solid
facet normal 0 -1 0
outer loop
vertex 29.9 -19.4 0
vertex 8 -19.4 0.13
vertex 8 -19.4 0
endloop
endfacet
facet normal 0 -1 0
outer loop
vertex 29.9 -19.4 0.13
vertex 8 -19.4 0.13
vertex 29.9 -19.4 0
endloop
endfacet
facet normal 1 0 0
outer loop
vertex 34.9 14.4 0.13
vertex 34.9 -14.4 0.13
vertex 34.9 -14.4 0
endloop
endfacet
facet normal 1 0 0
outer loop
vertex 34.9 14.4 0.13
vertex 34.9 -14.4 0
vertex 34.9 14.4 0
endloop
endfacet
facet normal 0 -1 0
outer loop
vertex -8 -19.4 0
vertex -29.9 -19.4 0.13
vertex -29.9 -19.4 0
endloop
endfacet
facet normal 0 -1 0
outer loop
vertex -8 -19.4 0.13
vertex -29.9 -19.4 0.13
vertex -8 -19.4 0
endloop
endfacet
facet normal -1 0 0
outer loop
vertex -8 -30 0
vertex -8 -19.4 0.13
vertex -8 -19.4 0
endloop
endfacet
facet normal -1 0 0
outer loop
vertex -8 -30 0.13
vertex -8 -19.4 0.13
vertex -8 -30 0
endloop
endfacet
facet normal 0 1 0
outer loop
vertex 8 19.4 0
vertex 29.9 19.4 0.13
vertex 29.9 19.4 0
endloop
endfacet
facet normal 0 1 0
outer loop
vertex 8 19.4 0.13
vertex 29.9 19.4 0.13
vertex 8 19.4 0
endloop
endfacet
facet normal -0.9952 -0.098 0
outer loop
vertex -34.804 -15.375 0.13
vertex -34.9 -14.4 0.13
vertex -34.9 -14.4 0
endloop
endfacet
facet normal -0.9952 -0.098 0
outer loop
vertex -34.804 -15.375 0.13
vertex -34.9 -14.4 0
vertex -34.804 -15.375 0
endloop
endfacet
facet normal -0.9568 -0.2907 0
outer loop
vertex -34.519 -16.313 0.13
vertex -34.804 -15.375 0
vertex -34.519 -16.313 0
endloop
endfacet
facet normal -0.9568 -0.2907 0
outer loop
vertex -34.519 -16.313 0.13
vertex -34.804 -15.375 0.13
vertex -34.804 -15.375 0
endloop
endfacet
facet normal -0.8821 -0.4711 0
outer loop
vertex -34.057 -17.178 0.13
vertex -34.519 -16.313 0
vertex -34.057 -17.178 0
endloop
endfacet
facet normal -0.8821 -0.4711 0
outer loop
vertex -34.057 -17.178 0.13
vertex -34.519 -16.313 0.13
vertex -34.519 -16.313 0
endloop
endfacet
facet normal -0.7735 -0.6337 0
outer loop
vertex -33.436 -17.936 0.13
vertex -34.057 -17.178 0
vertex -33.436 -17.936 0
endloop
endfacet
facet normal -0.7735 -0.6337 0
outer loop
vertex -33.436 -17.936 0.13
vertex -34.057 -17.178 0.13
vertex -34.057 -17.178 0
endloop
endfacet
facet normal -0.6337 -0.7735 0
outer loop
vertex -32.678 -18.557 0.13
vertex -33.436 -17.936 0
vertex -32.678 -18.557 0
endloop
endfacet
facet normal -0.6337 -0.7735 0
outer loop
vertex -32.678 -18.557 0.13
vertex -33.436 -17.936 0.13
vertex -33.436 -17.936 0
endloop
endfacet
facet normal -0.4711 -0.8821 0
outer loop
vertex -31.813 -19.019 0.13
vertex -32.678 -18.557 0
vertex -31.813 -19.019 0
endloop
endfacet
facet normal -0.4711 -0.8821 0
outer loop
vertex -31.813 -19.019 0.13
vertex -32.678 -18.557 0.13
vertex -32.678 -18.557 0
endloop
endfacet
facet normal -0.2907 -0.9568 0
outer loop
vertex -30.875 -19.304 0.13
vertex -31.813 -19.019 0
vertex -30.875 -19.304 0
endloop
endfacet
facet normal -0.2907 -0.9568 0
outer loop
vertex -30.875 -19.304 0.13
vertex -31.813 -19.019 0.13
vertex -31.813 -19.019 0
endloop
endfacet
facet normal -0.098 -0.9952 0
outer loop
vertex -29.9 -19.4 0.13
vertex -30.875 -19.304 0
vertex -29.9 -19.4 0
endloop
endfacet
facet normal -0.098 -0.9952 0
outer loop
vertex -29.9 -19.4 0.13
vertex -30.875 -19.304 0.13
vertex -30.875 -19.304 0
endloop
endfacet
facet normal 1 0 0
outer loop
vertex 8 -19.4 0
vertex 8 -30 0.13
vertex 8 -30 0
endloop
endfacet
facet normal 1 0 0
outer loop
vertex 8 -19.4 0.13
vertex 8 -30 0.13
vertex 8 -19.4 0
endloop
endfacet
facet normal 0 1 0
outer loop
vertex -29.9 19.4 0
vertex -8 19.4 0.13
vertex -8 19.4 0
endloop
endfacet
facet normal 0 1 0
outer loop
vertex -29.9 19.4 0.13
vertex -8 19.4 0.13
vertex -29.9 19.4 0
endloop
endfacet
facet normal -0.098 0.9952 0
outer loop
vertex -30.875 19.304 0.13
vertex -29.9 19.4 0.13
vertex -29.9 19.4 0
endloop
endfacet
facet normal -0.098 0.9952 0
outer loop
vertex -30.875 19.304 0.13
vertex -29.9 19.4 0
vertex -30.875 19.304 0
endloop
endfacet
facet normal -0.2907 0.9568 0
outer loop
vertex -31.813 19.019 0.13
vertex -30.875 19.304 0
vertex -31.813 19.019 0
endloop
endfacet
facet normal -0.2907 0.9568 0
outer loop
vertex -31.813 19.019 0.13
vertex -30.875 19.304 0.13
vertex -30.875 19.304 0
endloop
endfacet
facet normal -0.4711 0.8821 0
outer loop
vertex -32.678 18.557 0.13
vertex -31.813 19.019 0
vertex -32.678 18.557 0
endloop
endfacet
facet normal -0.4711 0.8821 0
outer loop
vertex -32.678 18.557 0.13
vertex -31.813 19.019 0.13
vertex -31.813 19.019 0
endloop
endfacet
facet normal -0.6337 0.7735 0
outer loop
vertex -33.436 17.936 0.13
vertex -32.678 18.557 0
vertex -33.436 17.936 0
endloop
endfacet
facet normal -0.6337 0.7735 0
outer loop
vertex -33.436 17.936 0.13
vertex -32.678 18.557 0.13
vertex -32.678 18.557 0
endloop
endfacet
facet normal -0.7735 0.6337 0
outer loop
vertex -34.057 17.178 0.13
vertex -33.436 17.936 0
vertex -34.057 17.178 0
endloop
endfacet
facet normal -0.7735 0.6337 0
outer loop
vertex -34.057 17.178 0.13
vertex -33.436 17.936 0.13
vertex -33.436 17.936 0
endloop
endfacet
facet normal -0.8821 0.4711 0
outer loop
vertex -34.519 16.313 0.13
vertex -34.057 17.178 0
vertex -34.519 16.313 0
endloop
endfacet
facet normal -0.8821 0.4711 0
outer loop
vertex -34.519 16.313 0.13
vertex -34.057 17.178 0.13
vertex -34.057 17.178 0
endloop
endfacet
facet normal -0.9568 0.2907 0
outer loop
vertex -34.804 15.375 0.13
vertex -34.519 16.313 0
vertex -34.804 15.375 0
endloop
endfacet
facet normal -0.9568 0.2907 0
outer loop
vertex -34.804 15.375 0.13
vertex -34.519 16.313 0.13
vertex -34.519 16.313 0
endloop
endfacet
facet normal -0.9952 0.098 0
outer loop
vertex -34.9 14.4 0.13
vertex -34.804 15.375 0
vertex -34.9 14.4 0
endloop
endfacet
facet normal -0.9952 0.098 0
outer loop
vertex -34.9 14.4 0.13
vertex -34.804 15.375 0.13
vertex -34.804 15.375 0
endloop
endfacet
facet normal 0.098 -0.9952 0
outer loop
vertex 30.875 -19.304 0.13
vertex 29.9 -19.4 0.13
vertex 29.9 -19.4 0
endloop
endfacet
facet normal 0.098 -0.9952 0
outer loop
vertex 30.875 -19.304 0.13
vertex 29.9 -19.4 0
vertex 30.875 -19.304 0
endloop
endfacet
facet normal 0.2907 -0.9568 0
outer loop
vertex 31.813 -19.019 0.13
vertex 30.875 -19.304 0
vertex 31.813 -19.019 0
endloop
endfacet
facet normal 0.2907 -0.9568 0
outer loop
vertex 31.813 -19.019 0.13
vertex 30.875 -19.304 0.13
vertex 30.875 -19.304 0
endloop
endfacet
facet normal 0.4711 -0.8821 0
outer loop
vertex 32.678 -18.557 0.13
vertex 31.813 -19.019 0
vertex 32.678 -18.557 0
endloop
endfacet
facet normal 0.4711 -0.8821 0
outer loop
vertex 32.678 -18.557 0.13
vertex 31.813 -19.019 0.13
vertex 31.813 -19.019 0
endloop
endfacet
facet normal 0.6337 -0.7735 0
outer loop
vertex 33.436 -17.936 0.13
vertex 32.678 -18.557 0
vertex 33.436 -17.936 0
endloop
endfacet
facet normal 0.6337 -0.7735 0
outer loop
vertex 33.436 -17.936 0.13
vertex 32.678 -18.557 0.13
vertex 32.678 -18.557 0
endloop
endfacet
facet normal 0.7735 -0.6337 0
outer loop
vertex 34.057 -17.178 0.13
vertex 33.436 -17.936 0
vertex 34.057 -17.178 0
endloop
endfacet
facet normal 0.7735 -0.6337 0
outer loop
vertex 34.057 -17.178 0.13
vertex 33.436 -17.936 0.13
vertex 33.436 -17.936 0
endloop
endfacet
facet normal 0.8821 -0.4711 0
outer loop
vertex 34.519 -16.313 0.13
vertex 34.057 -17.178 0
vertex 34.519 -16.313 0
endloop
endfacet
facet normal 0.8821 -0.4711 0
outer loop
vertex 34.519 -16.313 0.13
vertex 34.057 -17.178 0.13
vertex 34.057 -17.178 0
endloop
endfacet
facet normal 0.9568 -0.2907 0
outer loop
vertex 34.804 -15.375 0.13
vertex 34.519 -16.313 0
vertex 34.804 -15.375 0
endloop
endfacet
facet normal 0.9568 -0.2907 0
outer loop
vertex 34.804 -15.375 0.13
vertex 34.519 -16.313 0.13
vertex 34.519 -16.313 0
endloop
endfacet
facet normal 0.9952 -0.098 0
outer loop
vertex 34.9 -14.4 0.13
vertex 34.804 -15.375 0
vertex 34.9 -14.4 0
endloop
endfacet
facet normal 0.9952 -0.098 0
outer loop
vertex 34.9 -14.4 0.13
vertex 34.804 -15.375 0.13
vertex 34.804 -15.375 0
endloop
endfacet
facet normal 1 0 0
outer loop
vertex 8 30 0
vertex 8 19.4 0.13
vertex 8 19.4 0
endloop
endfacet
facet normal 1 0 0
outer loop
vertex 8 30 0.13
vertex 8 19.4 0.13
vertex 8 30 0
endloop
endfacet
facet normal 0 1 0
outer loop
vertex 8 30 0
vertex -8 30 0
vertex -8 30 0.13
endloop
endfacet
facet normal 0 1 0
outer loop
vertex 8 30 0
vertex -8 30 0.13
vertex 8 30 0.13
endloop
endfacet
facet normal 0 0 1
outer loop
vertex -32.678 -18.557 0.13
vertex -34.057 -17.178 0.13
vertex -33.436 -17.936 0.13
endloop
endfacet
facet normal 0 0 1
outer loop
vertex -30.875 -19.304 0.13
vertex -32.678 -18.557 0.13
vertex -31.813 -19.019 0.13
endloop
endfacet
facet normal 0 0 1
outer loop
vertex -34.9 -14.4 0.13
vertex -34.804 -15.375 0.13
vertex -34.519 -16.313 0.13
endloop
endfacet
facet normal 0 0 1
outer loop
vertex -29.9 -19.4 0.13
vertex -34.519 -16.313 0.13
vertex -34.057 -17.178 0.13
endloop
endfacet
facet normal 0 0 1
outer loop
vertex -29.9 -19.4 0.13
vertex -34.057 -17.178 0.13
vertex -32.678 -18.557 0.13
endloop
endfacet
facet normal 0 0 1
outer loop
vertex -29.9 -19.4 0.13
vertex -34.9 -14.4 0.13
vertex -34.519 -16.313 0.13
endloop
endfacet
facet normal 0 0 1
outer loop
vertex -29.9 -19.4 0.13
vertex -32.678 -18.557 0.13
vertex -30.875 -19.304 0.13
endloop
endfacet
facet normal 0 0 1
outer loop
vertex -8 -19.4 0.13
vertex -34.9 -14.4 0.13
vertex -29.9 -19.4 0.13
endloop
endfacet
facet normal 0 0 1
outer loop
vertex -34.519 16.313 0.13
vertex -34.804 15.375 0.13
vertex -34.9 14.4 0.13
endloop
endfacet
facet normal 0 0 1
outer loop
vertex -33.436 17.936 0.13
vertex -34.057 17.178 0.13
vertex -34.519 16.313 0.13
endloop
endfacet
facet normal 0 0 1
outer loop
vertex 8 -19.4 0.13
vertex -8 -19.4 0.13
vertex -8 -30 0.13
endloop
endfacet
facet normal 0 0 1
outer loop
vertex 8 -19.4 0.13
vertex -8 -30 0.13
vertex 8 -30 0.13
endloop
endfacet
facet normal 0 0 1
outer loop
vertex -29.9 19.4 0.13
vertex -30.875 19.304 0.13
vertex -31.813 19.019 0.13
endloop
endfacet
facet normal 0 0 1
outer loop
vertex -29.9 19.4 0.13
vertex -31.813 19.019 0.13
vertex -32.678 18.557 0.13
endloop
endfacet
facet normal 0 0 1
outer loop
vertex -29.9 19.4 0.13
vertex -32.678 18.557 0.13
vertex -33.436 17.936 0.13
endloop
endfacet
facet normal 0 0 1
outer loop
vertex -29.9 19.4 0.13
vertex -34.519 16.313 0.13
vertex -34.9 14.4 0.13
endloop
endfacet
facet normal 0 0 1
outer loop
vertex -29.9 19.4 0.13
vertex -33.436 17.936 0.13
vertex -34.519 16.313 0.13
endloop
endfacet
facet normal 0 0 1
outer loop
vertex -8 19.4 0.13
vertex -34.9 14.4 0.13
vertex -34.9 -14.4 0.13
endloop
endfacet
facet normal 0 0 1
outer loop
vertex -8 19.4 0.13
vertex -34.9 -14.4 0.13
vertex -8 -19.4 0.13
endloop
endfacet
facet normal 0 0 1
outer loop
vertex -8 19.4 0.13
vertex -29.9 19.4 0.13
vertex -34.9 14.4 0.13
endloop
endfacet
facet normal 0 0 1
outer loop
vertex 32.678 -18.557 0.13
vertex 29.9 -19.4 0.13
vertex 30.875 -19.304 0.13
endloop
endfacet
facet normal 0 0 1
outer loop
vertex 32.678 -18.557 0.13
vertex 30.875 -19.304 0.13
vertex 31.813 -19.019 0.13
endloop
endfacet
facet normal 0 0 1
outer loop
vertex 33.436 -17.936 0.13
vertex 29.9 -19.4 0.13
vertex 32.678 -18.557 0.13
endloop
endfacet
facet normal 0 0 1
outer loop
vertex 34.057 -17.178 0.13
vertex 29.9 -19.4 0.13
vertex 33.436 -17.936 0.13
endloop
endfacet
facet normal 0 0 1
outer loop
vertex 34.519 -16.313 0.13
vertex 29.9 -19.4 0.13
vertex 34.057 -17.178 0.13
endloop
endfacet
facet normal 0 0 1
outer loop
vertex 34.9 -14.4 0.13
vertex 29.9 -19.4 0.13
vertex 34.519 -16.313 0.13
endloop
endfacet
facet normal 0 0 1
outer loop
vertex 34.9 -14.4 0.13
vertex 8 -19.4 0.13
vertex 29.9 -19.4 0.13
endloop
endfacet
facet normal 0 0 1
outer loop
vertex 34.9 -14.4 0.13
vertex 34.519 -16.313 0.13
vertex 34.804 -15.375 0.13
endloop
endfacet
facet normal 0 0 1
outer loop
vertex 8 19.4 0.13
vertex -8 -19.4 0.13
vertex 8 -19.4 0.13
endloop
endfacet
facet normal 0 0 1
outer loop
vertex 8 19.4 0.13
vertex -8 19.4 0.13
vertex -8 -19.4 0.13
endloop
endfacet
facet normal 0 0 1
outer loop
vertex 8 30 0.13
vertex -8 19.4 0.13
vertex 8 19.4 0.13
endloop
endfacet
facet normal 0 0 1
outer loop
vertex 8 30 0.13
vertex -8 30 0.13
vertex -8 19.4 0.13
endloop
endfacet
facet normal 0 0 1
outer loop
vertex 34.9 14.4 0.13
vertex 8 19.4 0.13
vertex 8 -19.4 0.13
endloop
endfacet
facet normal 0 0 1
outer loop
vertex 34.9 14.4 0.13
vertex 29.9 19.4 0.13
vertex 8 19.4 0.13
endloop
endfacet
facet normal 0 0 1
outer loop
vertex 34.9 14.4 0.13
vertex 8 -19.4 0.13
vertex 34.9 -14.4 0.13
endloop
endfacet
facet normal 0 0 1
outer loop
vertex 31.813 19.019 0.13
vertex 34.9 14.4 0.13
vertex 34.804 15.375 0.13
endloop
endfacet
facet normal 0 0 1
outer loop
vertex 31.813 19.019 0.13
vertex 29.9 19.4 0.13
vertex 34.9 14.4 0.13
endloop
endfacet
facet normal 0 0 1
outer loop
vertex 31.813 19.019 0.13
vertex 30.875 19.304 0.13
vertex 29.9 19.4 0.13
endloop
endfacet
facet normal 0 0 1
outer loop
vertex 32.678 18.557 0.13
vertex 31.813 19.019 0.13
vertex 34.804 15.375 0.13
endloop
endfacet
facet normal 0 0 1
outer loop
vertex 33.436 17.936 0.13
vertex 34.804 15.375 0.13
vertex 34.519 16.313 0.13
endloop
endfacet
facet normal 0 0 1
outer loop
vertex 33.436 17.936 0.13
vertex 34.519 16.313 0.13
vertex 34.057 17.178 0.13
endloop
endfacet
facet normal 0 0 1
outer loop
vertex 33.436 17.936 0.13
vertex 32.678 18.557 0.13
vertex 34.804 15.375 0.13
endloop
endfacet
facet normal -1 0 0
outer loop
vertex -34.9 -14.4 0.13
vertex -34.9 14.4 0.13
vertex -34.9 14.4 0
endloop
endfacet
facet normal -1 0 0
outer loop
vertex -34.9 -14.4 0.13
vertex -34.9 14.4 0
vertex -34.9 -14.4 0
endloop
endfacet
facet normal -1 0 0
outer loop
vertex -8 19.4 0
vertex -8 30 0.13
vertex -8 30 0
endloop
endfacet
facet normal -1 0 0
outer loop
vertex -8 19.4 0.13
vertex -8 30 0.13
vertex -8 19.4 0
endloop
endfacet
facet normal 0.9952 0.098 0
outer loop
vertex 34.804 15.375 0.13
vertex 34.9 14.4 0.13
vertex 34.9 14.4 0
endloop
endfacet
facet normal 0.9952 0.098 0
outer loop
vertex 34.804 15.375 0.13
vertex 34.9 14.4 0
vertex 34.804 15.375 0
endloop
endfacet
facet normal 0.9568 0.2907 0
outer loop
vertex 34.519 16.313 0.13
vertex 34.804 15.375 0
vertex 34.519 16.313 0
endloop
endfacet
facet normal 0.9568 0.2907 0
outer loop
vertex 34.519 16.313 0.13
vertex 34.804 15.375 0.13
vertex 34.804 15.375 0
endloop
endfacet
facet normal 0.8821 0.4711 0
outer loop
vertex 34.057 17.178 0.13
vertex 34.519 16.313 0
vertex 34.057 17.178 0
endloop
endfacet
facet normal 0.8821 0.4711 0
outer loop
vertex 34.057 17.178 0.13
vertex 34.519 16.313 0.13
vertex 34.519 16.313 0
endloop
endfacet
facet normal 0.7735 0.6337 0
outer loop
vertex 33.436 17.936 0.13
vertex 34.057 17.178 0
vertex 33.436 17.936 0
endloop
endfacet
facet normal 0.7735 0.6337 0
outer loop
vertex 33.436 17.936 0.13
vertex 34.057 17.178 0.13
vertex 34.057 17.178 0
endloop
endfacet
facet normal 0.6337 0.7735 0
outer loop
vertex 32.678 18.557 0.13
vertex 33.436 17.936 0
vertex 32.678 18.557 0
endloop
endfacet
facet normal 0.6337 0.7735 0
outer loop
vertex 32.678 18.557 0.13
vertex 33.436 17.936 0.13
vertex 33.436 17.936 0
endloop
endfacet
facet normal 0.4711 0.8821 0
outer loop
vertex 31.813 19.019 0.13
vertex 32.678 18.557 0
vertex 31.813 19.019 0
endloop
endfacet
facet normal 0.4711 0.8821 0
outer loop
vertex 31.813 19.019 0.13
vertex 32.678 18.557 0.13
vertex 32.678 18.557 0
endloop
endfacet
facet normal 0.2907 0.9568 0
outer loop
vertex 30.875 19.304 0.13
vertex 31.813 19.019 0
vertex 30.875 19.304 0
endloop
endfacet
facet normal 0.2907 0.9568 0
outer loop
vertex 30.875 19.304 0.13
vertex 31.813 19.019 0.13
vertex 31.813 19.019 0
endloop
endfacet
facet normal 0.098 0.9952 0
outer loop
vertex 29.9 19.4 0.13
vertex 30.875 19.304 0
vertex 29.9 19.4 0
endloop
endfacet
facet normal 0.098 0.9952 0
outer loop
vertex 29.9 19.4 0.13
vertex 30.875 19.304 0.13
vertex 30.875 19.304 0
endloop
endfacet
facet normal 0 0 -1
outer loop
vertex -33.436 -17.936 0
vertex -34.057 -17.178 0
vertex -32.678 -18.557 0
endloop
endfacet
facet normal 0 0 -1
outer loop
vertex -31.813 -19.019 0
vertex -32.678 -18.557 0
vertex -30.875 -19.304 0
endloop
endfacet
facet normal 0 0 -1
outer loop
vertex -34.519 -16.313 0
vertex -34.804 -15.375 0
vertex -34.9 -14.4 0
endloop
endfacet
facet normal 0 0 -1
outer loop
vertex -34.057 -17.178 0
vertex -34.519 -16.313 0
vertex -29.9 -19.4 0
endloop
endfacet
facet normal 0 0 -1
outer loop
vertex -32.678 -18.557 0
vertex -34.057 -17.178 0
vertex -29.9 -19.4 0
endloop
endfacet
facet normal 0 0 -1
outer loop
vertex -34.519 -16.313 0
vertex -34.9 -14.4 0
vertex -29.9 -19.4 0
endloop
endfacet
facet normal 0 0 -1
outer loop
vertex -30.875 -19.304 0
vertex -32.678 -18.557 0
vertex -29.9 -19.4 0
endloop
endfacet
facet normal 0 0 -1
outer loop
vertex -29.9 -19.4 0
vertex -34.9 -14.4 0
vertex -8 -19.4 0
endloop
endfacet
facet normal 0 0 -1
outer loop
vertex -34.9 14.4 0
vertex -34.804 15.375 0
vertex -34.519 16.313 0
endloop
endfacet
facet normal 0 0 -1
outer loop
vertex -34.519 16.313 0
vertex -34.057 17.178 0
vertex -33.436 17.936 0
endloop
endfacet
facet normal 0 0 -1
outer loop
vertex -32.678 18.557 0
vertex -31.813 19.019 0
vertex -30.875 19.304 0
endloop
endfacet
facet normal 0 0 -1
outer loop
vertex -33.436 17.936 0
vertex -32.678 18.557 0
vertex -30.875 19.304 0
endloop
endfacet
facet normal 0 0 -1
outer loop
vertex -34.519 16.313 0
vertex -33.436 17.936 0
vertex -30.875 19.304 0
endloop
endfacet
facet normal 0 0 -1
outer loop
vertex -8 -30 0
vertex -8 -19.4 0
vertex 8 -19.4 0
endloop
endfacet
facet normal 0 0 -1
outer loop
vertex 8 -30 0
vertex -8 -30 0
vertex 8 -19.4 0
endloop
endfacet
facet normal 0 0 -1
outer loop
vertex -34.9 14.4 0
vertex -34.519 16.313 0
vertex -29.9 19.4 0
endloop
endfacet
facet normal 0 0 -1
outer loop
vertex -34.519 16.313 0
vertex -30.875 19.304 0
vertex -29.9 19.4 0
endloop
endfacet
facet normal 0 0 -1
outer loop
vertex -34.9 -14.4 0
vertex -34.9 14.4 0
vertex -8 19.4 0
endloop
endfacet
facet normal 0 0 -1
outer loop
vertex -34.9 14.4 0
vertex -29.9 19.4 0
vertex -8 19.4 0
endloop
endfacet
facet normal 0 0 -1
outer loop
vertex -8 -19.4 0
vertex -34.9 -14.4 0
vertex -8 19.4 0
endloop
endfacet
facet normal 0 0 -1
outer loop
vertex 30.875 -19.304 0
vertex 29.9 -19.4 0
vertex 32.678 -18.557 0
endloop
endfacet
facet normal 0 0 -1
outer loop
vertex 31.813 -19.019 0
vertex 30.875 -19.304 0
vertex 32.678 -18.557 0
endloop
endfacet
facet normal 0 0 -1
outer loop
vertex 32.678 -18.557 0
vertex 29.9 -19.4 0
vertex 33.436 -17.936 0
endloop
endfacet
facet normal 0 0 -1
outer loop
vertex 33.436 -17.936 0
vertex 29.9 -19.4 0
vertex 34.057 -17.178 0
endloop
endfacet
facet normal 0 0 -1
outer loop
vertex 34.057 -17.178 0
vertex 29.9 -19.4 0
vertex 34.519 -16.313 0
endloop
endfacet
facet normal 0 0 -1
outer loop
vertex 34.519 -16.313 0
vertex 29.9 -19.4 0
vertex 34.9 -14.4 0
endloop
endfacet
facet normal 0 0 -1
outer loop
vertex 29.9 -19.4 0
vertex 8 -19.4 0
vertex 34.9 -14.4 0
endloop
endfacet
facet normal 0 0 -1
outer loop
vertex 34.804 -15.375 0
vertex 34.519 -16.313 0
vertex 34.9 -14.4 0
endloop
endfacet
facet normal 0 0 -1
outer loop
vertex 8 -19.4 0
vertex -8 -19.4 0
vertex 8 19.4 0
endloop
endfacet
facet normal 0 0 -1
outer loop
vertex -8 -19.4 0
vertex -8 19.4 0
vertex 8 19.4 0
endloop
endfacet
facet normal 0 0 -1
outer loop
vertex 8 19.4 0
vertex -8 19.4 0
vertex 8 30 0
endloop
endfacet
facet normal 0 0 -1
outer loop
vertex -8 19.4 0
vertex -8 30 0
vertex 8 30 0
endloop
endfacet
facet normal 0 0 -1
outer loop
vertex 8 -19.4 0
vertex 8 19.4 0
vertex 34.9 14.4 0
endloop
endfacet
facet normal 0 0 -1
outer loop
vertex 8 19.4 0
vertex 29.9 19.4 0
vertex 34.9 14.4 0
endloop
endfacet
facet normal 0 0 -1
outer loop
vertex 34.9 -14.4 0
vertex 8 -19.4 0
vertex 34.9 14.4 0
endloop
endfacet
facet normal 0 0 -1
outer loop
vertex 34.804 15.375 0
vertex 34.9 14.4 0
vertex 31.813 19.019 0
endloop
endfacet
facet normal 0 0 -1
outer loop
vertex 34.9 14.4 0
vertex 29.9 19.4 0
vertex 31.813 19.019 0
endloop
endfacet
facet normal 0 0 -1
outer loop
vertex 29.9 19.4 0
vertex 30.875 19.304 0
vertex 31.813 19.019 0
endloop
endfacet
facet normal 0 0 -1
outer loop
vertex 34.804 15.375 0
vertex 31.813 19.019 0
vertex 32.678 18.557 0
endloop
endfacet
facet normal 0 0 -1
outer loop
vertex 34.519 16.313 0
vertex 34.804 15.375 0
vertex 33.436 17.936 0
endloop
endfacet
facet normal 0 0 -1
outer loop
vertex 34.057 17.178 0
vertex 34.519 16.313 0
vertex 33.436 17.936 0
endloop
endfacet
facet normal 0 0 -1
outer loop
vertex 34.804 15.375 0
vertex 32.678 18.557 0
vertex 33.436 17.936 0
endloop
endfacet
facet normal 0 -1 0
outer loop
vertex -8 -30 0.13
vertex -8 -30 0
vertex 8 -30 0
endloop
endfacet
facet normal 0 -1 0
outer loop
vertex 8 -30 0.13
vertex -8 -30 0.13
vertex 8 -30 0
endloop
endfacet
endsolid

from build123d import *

# Parameters (mm, degrees)
SKETCH_1_W          = 76
SKETCH_1_H          = 60
EXTRUDE_1_DEPTH     = 0.13
SKETCH_2_W          = 30
SKETCH_2_H          = 10
CUT_EXTRUDE_1_DEPTH = 49.41504828
CUT_EXTRUDE_2_DEPTH = 49.41504828


with BuildPart() as part:
    # 草圖1 → 填料-伸長1 (new body)
    with BuildSketch(Plane.XY):
        Rectangle(SKETCH_1_W, SKETCH_1_H)
    extrude(amount=EXTRUDE_1_DEPTH)

    # 草圖2 → 除料-伸長1 (cut, through all)
    with BuildSketch(Plane.XY.offset(0.13)):
        with Locations((-23, 25)):
            Rectangle(SKETCH_2_W, SKETCH_2_H)
        with Locations((23, 25)):
            Rectangle(SKETCH_2_W, SKETCH_2_H)
        with Locations((23, -25)):
            Rectangle(SKETCH_2_W, SKETCH_2_H)
        with Locations((-23, -25)):
            Rectangle(SKETCH_2_W, SKETCH_2_H)
    extrude(amount=-CUT_EXTRUDE_1_DEPTH, mode=Mode.SUBTRACT)

    # 草圖3 → 除料-伸長2 (cut, through all)
    with BuildSketch(Plane.XY.offset(0.13)):
        with BuildLine():
            Line((-8, 19.4), (-29.9, 19.4))
            ThreePointArc((-29.9, 19.4), (-33.435533906, 17.935533906), (-34.9, 14.4))
            Line((-34.9, 14.4), (-34.9, -14.4))
            ThreePointArc((-34.9, -14.4), (-33.435533906, -17.935533906), (-29.9, -19.4))
            Line((-29.9, -19.4), (-8, -19.4))
            Line((-8, -19.4), (-8, -20))
            Line((-8, -20), (-38, -20))
            Line((-38, -20), (-38, 20))
            Line((-38, 20), (-8, 20))
            Line((-8, 20), (-8, 19.4))
        make_face()
        with BuildLine():
            Line((8, -20), (8, -19.4))
            Line((8, -19.4), (29.9, -19.4))
            ThreePointArc((29.9, -19.4), (33.435533906, -17.935533906), (34.9, -14.4))
            Line((34.9, -14.4), (34.9, 14.4))
            ThreePointArc((34.9, 14.4), (33.435533906, 17.935533906), (29.9, 19.4))
            Line((29.9, 19.4), (8, 19.4))
            Line((8, 19.4), (8, 20))
            Line((8, 20), (38, 20))
            Line((38, 20), (38, -20))
            Line((38, -20), (8, -20))
        make_face()
    extrude(amount=-CUT_EXTRUDE_2_DEPTH, mode=Mode.SUBTRACT)


solid = part.part
